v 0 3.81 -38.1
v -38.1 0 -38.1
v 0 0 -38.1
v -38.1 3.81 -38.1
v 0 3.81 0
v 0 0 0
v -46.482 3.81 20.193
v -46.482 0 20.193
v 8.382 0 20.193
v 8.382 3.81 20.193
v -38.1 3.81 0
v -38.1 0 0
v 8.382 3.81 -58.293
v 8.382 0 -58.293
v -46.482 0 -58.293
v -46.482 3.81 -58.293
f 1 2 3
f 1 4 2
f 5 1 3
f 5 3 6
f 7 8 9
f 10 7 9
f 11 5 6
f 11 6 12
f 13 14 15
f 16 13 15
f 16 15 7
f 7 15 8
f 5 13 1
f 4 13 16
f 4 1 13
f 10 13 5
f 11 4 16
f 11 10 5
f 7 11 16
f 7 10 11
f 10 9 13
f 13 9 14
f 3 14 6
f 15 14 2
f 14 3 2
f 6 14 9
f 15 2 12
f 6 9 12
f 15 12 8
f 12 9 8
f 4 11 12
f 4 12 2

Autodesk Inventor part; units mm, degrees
ref_plane "YZ Plane" through (0, 0, 0) normal (1, 0, 0) x (0, 1, 0)
ref_plane "XZ Plane" through (0, 0, 0) normal (0, 1, 0) x (-1, 0, 0)
ref_plane "XY Plane" through (0, 0, 0) normal (0, 0, 1) x (1, 0, 0)
sketch "Sketch1" plane through (0, 0, 0) normal (0, 1, 0) x (-1, 0, 0)
  line L0 (38.1, 0) -> (38.1, -38.1)
  line L1 (0, -38.1) -> (0, 0)
  line L2 (0, 0) -> (0, 11.811)
  line L3 (0, 11.811) -> (38.1, 11.811)
  line L4 (38.1, 11.811) -> (38.1, 0)
  line L5 (0, -38.1) -> (0, -49.911)
  line L6 (0, -49.911) -> (38.1, -49.911)
  line L7 (38.1, -49.911) -> (38.1, -38.1)
  line L8 (-8.382, -38.1) -> (-8.382, -58.293)
  line L9 (-8.382, -58.293) -> (46.482, -58.293)
  line L10 (46.482, -58.293) -> (46.482, -38.1)
  line L11 (46.482, -38.1) -> (46.482, 0)
  line L12 (46.482, 0) -> (46.482, 20.193)
  line L13 (46.482, 20.193) -> (-8.382, 20.193)
  line L14 (-8.382, 20.193) -> (-8.382, 0)
  line L15 (-8.382, 0) -> (-8.382, -38.1)
  dimension "d0" = 38.1
  dimension "d1" = 38.1
  dimension "d2" = 11.811
  dimension "d3" = 11.811
  dimension "d4" = 8.382
extrude "Extrusion1" add sketch "Sketch1" along normal blind 3.81 contours L0 L7 L6 L5 L1 L2 L3 L4 | L15 L14 L13 L12 L11 L10 L9 L8
sketch "Sketch2" plane through (0, 3.81, 0) normal (0, 1, 0) x (1, 0, 0)
  line L0 (0, 0) -> (-38.1, 0)
  line L1 (-38.1, 0) -> (-38.1, 38.1)
  line L2 (-38.1, 38.1) -> (0, 38.1)
  line L3 (0, 38.1) -> (0, 0)
  dimension "d7" = 38.1
  dimension "d8" = 38.1
extrude "Extrusion2" cut sketch "Sketch2" against normal blind 13.6525
properties part number "peltier felt" material "Acetal Resin, Black"
